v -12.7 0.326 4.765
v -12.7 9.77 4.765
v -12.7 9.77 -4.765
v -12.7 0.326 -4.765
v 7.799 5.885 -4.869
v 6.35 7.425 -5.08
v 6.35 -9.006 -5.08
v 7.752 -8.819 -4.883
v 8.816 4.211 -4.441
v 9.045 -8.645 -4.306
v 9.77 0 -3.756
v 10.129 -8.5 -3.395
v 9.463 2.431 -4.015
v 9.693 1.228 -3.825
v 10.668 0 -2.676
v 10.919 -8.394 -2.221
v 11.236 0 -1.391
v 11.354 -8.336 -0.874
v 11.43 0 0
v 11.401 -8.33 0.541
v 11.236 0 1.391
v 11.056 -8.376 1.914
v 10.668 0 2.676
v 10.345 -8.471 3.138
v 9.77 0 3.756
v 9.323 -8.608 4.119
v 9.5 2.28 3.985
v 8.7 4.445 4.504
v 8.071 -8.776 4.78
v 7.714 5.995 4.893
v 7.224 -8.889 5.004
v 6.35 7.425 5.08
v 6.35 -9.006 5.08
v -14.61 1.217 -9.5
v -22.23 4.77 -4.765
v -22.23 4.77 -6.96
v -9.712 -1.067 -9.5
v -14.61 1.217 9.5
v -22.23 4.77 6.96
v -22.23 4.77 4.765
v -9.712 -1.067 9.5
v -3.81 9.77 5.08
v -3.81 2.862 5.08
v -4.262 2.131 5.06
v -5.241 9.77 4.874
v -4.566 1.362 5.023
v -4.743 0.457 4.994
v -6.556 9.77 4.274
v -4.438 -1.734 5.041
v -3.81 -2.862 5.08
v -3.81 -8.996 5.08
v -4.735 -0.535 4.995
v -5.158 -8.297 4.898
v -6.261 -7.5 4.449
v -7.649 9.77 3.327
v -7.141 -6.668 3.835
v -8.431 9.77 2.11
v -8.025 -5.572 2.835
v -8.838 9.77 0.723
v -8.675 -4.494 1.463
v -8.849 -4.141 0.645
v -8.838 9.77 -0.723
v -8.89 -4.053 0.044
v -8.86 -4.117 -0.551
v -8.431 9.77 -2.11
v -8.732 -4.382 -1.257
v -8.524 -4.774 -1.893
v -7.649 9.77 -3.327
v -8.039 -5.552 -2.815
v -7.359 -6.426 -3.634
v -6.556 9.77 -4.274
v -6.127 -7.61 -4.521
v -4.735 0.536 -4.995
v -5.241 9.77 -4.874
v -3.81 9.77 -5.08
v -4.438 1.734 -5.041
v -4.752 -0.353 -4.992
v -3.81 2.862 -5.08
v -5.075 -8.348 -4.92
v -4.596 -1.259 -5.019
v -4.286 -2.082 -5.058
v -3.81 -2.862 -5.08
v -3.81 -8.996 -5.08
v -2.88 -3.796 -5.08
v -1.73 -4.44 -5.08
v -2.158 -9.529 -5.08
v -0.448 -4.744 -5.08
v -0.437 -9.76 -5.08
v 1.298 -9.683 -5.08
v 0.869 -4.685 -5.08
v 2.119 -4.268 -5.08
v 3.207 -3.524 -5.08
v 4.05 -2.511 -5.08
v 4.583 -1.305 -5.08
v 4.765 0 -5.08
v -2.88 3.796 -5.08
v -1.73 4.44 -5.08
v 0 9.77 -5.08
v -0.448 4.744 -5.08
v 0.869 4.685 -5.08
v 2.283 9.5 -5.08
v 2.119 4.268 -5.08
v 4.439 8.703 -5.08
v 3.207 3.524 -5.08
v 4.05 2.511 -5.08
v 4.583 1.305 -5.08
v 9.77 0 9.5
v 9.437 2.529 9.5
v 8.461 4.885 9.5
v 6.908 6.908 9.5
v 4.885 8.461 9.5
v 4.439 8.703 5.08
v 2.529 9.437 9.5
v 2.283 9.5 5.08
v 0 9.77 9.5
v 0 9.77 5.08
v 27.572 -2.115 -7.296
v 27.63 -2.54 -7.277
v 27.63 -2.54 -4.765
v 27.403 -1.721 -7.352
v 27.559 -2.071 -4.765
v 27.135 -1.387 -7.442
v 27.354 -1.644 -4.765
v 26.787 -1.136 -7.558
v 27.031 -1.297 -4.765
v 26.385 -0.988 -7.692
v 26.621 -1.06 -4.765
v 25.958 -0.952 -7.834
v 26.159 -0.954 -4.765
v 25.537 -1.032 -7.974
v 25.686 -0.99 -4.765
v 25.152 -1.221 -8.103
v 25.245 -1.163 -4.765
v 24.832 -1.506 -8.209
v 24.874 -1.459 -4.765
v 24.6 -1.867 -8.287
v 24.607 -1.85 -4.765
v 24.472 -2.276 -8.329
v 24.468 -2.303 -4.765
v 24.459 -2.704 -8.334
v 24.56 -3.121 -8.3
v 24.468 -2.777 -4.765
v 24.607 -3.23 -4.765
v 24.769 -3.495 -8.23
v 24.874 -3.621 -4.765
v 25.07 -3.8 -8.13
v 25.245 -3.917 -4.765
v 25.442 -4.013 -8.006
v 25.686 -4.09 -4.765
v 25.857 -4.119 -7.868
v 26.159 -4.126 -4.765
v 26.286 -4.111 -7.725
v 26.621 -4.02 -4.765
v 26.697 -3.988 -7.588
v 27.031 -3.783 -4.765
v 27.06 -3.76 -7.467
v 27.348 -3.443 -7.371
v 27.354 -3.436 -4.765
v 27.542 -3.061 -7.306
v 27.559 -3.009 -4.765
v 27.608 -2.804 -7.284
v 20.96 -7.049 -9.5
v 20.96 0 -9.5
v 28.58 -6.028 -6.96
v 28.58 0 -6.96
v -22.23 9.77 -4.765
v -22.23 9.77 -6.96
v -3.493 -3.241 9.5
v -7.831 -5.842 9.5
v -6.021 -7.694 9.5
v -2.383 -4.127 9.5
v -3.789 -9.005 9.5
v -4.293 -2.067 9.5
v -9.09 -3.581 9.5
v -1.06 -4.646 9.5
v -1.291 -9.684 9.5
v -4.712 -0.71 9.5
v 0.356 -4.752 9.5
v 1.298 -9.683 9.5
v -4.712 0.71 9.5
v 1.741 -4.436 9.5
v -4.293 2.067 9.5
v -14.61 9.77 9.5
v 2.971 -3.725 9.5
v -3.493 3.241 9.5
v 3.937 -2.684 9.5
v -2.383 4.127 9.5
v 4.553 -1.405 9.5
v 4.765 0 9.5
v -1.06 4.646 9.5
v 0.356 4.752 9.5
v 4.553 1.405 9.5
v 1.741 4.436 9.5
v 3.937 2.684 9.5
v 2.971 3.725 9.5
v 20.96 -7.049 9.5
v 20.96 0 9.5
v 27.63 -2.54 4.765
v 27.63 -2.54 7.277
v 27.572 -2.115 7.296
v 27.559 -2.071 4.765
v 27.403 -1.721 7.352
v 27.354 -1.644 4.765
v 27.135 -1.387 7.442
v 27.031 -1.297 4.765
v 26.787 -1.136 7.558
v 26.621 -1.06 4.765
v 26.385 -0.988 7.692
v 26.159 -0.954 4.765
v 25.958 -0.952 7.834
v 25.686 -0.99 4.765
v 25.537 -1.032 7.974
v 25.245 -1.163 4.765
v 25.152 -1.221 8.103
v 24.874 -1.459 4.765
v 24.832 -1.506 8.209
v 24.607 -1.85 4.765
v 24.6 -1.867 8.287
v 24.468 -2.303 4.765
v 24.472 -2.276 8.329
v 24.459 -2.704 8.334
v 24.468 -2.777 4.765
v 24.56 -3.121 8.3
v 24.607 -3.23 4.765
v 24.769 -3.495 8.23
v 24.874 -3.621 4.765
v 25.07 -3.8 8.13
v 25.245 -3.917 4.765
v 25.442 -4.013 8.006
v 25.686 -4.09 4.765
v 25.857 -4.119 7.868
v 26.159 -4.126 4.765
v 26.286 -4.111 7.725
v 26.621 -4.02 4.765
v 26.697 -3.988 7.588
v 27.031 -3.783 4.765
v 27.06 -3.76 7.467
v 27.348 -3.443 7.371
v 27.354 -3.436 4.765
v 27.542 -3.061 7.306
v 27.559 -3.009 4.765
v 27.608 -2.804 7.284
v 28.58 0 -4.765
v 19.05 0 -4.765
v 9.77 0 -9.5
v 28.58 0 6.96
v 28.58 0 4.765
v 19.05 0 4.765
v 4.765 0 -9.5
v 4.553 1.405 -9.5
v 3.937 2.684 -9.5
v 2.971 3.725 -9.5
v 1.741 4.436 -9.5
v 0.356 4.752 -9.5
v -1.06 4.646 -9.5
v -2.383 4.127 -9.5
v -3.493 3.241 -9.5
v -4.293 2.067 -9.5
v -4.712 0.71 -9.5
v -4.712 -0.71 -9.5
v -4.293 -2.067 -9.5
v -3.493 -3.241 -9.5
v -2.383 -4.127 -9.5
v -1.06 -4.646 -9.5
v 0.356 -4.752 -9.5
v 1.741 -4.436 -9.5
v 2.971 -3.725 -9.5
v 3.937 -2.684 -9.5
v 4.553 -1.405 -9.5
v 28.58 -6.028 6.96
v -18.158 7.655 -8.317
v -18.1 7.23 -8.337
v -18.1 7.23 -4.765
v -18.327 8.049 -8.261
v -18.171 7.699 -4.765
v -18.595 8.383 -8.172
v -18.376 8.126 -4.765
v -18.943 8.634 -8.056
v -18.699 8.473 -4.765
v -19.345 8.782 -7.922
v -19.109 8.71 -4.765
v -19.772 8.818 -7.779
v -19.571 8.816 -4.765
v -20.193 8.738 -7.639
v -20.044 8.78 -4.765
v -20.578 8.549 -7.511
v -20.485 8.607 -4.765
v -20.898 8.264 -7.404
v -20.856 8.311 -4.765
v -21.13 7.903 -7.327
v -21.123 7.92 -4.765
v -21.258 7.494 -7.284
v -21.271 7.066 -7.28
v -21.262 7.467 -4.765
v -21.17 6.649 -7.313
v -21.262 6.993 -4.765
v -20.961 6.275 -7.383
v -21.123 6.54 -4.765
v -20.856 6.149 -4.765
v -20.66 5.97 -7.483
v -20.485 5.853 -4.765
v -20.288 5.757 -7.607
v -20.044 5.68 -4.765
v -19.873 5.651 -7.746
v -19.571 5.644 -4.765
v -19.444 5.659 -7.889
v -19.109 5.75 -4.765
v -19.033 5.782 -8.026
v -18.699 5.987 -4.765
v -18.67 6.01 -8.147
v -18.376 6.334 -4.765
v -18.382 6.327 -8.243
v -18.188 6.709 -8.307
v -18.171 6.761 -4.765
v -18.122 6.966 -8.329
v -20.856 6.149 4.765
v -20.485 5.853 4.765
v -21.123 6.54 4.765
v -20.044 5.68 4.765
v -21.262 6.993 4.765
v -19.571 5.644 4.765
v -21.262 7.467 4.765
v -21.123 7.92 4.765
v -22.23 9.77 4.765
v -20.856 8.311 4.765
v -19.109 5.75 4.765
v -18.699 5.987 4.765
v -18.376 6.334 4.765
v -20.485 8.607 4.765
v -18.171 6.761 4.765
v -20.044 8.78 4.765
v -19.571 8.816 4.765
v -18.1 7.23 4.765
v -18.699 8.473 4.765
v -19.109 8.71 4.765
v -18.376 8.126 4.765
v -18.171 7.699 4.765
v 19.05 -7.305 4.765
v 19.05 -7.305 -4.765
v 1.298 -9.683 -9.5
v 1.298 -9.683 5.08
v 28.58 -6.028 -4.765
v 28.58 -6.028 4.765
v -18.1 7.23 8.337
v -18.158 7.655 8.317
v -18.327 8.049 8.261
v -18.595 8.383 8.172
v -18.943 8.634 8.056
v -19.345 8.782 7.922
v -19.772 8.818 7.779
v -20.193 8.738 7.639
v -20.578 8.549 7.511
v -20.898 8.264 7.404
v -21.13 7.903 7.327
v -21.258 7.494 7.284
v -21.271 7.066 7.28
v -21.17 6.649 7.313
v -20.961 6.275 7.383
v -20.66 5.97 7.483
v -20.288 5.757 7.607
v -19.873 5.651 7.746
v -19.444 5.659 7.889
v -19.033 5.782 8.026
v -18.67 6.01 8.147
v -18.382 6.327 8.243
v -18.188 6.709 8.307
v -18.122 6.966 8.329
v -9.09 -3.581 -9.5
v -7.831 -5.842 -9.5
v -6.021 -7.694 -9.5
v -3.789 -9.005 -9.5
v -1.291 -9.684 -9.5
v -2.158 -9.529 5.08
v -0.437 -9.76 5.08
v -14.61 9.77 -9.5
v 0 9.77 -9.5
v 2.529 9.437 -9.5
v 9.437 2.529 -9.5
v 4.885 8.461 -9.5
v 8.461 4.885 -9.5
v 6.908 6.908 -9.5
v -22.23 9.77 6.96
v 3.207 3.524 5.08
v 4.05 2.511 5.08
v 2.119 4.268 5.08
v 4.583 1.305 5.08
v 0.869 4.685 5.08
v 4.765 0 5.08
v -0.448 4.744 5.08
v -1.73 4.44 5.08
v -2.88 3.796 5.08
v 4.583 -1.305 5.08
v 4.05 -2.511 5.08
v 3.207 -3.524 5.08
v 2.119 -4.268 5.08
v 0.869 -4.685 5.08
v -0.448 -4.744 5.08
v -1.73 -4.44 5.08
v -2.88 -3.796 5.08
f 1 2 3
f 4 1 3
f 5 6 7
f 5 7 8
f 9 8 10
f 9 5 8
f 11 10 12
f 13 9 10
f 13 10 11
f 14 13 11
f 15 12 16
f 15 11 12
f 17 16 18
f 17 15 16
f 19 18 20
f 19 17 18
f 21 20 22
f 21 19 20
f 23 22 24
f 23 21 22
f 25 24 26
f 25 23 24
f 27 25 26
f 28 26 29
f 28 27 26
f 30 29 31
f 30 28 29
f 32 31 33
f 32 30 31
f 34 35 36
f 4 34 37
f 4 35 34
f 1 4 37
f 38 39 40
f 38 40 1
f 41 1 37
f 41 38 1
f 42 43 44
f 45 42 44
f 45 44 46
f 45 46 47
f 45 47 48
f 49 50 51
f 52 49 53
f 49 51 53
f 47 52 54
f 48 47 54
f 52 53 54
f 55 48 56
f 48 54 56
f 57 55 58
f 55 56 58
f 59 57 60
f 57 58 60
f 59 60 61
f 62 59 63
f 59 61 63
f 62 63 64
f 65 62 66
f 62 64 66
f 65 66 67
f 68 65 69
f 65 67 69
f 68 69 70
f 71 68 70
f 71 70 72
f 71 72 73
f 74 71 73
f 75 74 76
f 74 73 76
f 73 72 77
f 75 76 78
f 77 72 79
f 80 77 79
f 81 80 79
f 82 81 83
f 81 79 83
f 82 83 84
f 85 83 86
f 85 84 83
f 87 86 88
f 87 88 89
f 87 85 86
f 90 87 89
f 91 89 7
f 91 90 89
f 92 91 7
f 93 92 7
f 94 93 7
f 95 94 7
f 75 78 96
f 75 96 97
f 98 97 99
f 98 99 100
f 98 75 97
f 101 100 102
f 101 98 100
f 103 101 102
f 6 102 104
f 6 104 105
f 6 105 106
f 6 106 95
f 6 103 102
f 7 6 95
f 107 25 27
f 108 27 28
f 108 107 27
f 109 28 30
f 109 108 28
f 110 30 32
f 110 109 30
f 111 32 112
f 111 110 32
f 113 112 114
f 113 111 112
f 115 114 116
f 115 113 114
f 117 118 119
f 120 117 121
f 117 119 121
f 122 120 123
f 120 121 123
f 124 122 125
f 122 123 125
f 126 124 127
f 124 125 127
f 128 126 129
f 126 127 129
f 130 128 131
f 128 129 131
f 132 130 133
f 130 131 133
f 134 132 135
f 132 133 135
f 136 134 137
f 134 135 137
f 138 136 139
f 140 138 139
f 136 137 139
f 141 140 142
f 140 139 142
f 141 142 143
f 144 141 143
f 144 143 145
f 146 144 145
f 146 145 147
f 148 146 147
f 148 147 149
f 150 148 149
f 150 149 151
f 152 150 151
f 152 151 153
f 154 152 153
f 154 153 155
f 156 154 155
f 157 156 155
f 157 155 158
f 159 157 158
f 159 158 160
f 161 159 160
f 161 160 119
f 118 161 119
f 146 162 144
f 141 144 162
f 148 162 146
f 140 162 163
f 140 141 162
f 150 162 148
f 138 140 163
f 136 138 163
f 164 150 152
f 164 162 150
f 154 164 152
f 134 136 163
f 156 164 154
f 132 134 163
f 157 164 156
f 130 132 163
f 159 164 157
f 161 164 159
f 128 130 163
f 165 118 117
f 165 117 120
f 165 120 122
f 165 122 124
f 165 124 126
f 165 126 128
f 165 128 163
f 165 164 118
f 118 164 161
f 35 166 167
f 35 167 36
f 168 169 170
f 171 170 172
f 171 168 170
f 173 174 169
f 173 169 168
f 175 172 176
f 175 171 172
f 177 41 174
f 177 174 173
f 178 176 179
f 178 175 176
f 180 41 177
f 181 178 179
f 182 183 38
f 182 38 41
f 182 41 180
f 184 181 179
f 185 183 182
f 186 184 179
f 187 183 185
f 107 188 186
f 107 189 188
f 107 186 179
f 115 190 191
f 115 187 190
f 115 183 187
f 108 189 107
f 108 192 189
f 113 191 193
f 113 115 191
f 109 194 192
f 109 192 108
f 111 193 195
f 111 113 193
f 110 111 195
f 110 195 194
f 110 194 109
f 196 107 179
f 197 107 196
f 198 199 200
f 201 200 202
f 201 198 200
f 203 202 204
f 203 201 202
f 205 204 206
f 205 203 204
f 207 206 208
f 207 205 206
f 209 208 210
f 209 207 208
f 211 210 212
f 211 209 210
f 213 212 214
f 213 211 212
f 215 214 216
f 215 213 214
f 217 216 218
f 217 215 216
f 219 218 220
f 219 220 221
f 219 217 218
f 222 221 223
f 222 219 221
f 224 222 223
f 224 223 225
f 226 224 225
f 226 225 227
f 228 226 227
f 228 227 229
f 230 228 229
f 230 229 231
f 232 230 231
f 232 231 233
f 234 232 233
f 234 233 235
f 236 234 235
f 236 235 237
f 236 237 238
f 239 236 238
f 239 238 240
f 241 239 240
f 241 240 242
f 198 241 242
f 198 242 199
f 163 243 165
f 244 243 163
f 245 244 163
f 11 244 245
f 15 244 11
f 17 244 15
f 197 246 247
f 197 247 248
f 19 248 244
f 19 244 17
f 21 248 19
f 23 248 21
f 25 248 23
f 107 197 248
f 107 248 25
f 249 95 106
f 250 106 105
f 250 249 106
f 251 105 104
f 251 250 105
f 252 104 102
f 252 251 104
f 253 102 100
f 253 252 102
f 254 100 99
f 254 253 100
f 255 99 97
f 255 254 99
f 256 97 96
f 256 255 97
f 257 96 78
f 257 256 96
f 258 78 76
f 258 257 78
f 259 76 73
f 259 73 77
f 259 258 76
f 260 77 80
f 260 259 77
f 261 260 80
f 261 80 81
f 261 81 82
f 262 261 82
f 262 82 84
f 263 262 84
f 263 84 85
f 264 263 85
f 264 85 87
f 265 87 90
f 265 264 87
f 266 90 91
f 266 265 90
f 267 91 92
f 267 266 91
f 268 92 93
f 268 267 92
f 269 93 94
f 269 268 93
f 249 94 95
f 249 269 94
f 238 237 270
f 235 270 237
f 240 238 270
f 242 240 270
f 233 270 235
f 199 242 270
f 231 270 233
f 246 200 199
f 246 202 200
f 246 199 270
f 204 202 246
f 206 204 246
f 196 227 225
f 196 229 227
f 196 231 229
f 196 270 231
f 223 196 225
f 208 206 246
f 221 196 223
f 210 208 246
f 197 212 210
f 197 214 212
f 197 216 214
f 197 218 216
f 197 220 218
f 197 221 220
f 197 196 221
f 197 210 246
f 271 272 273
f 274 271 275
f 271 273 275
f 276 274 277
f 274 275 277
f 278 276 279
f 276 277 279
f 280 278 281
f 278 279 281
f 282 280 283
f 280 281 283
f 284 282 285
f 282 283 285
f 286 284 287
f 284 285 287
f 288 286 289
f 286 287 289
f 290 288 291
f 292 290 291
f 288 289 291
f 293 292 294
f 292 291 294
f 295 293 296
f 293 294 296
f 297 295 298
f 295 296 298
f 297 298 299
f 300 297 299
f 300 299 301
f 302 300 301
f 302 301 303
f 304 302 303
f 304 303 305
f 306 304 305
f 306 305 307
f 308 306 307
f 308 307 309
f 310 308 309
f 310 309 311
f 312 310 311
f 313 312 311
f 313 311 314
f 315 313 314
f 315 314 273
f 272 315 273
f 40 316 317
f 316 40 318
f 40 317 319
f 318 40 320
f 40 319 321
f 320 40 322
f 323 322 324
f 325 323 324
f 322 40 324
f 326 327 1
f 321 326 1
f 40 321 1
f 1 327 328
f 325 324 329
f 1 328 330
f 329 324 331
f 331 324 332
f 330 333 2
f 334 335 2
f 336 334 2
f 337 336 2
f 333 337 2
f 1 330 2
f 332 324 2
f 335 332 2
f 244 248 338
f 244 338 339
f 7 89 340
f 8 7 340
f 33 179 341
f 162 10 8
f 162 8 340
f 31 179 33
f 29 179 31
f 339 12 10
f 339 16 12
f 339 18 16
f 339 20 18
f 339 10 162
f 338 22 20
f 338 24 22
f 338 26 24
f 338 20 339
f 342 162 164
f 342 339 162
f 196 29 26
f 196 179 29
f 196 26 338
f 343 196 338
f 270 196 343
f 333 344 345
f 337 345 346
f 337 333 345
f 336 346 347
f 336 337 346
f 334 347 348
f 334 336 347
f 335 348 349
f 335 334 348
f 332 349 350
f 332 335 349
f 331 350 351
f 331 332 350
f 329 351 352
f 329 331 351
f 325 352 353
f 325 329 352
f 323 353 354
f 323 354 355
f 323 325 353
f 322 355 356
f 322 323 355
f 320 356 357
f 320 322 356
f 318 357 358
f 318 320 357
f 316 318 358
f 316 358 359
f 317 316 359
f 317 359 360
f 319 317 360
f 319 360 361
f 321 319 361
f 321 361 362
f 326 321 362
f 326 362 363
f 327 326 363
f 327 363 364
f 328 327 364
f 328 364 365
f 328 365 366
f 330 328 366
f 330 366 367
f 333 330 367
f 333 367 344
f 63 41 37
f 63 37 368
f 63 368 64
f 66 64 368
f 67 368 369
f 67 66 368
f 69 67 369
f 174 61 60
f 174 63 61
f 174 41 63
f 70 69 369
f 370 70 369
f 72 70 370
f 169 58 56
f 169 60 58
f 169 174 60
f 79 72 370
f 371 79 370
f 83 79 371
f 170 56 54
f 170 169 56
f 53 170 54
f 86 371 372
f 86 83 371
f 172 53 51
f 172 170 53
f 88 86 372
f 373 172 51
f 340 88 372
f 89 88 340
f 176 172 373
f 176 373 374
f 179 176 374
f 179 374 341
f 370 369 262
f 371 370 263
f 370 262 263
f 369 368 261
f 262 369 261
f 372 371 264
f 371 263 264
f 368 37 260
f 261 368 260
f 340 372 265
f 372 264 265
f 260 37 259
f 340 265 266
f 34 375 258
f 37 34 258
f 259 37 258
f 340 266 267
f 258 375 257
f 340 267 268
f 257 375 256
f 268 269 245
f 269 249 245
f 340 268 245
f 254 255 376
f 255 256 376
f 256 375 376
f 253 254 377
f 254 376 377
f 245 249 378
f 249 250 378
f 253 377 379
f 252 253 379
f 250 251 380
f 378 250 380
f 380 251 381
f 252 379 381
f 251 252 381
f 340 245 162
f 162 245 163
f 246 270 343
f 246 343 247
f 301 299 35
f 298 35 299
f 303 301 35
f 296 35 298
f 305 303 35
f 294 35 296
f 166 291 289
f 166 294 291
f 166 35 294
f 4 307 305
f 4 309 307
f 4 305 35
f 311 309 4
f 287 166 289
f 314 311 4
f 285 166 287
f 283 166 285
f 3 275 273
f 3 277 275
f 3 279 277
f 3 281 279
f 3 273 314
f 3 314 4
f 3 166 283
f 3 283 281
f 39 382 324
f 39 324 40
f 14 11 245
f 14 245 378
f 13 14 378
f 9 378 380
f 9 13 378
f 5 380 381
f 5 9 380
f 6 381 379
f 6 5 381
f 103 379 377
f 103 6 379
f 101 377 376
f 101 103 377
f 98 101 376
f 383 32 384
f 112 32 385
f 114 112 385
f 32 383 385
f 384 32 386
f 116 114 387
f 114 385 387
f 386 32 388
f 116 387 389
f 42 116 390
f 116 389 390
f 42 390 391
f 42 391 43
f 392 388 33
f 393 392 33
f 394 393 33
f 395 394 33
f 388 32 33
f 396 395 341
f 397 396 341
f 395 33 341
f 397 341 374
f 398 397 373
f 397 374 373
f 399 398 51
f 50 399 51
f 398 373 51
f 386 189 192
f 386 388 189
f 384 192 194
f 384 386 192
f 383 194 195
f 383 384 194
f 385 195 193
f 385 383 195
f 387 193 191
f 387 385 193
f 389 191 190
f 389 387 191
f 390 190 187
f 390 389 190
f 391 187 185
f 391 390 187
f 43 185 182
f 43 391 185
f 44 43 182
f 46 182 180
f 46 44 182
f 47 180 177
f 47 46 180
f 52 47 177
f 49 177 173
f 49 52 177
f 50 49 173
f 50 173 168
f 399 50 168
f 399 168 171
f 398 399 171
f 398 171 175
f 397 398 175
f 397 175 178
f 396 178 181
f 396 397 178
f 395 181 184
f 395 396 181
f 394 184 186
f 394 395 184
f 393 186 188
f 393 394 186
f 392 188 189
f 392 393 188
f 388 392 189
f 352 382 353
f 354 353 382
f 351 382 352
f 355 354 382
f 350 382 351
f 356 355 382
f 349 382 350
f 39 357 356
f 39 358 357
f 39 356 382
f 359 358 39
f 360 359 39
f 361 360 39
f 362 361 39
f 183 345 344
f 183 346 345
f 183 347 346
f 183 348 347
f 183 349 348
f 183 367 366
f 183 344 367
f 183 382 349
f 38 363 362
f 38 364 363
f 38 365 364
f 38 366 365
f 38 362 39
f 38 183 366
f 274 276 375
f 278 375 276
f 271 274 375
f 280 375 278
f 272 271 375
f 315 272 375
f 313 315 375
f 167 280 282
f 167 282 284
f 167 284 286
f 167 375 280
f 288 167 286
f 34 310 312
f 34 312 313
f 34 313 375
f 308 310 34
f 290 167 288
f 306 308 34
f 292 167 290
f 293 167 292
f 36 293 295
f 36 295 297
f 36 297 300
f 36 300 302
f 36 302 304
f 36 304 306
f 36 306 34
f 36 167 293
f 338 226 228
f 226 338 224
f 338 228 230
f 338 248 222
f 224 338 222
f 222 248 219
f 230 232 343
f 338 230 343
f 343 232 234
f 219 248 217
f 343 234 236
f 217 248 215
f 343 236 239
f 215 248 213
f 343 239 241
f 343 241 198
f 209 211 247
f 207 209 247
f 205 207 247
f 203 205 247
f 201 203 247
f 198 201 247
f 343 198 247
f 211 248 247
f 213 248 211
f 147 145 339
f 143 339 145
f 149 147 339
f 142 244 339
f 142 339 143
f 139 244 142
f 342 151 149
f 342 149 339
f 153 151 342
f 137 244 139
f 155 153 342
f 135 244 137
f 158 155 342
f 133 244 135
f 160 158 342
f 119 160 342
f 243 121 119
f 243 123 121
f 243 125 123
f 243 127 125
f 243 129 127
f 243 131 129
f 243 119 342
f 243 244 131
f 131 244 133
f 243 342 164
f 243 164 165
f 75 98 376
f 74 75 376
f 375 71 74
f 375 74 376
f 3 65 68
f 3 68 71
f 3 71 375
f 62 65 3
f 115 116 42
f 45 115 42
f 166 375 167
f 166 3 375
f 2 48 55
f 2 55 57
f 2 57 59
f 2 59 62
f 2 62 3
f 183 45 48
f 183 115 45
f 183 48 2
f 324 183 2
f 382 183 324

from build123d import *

# Parameters (mm, degrees)
SKETCH1_R               = 4.765
BOSS_EXTRUDE2_DEPTH     = 9.5
CHAMFER1_SIZE           = 2.54
CHAMFER1_SIZE2          = 7.62
CHAMFER1_PART_2_SIZE    = 2.54
CHAMFER1_PART_2_SIZE2   = 7.62
CHAMFER2_SIZE           = 7.62
CHAMFER2_SIZE2          = 2.54
SKETCH3_W               = 9.53
SKETCH3_H               = 9.53
CUT_EXTRUDE1_DEPTH      = 20.54
CUT_EXTRUDE2_DEPTH      = 10.77
CUT_EXTRUDE2_DEPTH_BACK = 10.77
SKETCH5_R               = 1.59
CUT_EXTRUDE3_DEPTH      = 10.5000001
CUT_EXTRUDE3_DEPTH_BACK = 10.5000001


with BuildPart() as part:
    # Sketch1 → Boss-Extrude2 (new body, symmetric)
    with BuildSketch(Plane.XY):
        with BuildLine():
            Line((0, 9.77), (-22.23, 9.77))
            Line((-22.23, 9.77), (-22.23, 4.77))
            Line((-22.23, 4.77), (-9.711509246, -1.067468107))
            ThreePointArc((-9.711509246, -1.067468107), (-6.021421721, -7.693853421), (1.29754109, -9.683454297))
            Line((1.29754109, -9.683454297), (28.58, -6.027722532))
            Line((28.58, -6.027722532), (28.58, 0))
            Line((28.58, 0), (9.77, 0))
            ThreePointArc((9.77, 0), (6.908433252, 6.908433252), (0, 9.77))
        make_face()
        Circle(SKETCH1_R, mode=Mode.SUBTRACT)
    extrude(amount=BOSS_EXTRUDE2_DEPTH, both=True)

    # Chamfer1
    chamfer1_edges = [part.edges().sort_by_distance(p)[0] for p in [
        (-22.23, 7.27, 9.5),
    ]]
    chamfer1_side = [part.faces().sort_by_distance(p)[0] for p in [
        (-22.23, 7.27, 0),
    ]]
    chamfer(chamfer1_edges, length=CHAMFER1_SIZE, length2=CHAMFER1_SIZE2, reference=chamfer1_side[0])

    # Chamfer1 part 2
    chamfer1_part_2_edges = [part.edges().sort_by_distance(p)[0] for p in [
        (28.58, -3.013861266, 9.5),
    ]]
    chamfer1_part_2_side = [part.faces().sort_by_distance(p)[0] for p in [
        (28.58, -3.013861266, 0),
    ]]
    chamfer(chamfer1_part_2_edges, length=CHAMFER1_PART_2_SIZE, length2=CHAMFER1_PART_2_SIZE2, reference=chamfer1_part_2_side[0])

    # Chamfer2
    chamfer2_edges = [part.edges().sort_by_distance(p)[0] for p in [
        (-22.23, 7.27, -9.5),
        (28.58, -3.013861266, -9.5),
    ]]
    chamfer2_side = [part.faces().sort_by_distance(p)[0] for p in [
        (-11.115, 9.225622585, -9.5),
    ]]
    chamfer(chamfer2_edges, length=CHAMFER2_SIZE, length2=CHAMFER2_SIZE2, reference=chamfer2_side[0])

    # Sketch3 → Cut-Extrude1 (cut, through all)
    with BuildSketch(Plane(origin=(0, 9.77, 0), x_dir=(1, 0, 0), z_dir=(0, 1, 0))):
        with Locations((-17.465, 0)):
            Rectangle(SKETCH3_W, SKETCH3_H)
        with Locations((23.815, 0)):
            Rectangle(SKETCH3_W, SKETCH3_H)
    extrude(amount=-CUT_EXTRUDE1_DEPTH, mode=Mode.SUBTRACT)

    # Sketch4 → Cut-Extrude2 (cut, two sides)
    with BuildSketch(Plane(origin=(0, 0, 0), x_dir=(1, 0, 0), z_dir=(0, 1, 0))) as cut_extrude2_sk:
        with BuildLine():
            Line((-3.81, 5.08), (6.35, 5.08))
            ThreePointArc((6.35, 5.08), (11.43, 0), (6.35, -5.08))
            Line((6.35, -5.08), (-3.81, -5.08))
            ThreePointArc((-3.81, -5.08), (-8.89, 0), (-3.81, 5.08))
        make_face()
    extrude(amount=CUT_EXTRUDE2_DEPTH, mode=Mode.SUBTRACT)
    extrude(cut_extrude2_sk.sketch, amount=-CUT_EXTRUDE2_DEPTH_BACK, mode=Mode.SUBTRACT)

    # Sketch5 → Cut-Extrude3 (cut, two sides)
    with BuildSketch(Plane.XY) as cut_extrude3_sk:
        with Locations((-19.69, 7.23)):
            Circle(SKETCH5_R)
        with Locations((26.04, -2.54)):
            Circle(SKETCH5_R)
    extrude(amount=CUT_EXTRUDE3_DEPTH, mode=Mode.SUBTRACT)
    extrude(cut_extrude3_sk.sketch, amount=-CUT_EXTRUDE3_DEPTH_BACK, mode=Mode.SUBTRACT)


solid = part.part
